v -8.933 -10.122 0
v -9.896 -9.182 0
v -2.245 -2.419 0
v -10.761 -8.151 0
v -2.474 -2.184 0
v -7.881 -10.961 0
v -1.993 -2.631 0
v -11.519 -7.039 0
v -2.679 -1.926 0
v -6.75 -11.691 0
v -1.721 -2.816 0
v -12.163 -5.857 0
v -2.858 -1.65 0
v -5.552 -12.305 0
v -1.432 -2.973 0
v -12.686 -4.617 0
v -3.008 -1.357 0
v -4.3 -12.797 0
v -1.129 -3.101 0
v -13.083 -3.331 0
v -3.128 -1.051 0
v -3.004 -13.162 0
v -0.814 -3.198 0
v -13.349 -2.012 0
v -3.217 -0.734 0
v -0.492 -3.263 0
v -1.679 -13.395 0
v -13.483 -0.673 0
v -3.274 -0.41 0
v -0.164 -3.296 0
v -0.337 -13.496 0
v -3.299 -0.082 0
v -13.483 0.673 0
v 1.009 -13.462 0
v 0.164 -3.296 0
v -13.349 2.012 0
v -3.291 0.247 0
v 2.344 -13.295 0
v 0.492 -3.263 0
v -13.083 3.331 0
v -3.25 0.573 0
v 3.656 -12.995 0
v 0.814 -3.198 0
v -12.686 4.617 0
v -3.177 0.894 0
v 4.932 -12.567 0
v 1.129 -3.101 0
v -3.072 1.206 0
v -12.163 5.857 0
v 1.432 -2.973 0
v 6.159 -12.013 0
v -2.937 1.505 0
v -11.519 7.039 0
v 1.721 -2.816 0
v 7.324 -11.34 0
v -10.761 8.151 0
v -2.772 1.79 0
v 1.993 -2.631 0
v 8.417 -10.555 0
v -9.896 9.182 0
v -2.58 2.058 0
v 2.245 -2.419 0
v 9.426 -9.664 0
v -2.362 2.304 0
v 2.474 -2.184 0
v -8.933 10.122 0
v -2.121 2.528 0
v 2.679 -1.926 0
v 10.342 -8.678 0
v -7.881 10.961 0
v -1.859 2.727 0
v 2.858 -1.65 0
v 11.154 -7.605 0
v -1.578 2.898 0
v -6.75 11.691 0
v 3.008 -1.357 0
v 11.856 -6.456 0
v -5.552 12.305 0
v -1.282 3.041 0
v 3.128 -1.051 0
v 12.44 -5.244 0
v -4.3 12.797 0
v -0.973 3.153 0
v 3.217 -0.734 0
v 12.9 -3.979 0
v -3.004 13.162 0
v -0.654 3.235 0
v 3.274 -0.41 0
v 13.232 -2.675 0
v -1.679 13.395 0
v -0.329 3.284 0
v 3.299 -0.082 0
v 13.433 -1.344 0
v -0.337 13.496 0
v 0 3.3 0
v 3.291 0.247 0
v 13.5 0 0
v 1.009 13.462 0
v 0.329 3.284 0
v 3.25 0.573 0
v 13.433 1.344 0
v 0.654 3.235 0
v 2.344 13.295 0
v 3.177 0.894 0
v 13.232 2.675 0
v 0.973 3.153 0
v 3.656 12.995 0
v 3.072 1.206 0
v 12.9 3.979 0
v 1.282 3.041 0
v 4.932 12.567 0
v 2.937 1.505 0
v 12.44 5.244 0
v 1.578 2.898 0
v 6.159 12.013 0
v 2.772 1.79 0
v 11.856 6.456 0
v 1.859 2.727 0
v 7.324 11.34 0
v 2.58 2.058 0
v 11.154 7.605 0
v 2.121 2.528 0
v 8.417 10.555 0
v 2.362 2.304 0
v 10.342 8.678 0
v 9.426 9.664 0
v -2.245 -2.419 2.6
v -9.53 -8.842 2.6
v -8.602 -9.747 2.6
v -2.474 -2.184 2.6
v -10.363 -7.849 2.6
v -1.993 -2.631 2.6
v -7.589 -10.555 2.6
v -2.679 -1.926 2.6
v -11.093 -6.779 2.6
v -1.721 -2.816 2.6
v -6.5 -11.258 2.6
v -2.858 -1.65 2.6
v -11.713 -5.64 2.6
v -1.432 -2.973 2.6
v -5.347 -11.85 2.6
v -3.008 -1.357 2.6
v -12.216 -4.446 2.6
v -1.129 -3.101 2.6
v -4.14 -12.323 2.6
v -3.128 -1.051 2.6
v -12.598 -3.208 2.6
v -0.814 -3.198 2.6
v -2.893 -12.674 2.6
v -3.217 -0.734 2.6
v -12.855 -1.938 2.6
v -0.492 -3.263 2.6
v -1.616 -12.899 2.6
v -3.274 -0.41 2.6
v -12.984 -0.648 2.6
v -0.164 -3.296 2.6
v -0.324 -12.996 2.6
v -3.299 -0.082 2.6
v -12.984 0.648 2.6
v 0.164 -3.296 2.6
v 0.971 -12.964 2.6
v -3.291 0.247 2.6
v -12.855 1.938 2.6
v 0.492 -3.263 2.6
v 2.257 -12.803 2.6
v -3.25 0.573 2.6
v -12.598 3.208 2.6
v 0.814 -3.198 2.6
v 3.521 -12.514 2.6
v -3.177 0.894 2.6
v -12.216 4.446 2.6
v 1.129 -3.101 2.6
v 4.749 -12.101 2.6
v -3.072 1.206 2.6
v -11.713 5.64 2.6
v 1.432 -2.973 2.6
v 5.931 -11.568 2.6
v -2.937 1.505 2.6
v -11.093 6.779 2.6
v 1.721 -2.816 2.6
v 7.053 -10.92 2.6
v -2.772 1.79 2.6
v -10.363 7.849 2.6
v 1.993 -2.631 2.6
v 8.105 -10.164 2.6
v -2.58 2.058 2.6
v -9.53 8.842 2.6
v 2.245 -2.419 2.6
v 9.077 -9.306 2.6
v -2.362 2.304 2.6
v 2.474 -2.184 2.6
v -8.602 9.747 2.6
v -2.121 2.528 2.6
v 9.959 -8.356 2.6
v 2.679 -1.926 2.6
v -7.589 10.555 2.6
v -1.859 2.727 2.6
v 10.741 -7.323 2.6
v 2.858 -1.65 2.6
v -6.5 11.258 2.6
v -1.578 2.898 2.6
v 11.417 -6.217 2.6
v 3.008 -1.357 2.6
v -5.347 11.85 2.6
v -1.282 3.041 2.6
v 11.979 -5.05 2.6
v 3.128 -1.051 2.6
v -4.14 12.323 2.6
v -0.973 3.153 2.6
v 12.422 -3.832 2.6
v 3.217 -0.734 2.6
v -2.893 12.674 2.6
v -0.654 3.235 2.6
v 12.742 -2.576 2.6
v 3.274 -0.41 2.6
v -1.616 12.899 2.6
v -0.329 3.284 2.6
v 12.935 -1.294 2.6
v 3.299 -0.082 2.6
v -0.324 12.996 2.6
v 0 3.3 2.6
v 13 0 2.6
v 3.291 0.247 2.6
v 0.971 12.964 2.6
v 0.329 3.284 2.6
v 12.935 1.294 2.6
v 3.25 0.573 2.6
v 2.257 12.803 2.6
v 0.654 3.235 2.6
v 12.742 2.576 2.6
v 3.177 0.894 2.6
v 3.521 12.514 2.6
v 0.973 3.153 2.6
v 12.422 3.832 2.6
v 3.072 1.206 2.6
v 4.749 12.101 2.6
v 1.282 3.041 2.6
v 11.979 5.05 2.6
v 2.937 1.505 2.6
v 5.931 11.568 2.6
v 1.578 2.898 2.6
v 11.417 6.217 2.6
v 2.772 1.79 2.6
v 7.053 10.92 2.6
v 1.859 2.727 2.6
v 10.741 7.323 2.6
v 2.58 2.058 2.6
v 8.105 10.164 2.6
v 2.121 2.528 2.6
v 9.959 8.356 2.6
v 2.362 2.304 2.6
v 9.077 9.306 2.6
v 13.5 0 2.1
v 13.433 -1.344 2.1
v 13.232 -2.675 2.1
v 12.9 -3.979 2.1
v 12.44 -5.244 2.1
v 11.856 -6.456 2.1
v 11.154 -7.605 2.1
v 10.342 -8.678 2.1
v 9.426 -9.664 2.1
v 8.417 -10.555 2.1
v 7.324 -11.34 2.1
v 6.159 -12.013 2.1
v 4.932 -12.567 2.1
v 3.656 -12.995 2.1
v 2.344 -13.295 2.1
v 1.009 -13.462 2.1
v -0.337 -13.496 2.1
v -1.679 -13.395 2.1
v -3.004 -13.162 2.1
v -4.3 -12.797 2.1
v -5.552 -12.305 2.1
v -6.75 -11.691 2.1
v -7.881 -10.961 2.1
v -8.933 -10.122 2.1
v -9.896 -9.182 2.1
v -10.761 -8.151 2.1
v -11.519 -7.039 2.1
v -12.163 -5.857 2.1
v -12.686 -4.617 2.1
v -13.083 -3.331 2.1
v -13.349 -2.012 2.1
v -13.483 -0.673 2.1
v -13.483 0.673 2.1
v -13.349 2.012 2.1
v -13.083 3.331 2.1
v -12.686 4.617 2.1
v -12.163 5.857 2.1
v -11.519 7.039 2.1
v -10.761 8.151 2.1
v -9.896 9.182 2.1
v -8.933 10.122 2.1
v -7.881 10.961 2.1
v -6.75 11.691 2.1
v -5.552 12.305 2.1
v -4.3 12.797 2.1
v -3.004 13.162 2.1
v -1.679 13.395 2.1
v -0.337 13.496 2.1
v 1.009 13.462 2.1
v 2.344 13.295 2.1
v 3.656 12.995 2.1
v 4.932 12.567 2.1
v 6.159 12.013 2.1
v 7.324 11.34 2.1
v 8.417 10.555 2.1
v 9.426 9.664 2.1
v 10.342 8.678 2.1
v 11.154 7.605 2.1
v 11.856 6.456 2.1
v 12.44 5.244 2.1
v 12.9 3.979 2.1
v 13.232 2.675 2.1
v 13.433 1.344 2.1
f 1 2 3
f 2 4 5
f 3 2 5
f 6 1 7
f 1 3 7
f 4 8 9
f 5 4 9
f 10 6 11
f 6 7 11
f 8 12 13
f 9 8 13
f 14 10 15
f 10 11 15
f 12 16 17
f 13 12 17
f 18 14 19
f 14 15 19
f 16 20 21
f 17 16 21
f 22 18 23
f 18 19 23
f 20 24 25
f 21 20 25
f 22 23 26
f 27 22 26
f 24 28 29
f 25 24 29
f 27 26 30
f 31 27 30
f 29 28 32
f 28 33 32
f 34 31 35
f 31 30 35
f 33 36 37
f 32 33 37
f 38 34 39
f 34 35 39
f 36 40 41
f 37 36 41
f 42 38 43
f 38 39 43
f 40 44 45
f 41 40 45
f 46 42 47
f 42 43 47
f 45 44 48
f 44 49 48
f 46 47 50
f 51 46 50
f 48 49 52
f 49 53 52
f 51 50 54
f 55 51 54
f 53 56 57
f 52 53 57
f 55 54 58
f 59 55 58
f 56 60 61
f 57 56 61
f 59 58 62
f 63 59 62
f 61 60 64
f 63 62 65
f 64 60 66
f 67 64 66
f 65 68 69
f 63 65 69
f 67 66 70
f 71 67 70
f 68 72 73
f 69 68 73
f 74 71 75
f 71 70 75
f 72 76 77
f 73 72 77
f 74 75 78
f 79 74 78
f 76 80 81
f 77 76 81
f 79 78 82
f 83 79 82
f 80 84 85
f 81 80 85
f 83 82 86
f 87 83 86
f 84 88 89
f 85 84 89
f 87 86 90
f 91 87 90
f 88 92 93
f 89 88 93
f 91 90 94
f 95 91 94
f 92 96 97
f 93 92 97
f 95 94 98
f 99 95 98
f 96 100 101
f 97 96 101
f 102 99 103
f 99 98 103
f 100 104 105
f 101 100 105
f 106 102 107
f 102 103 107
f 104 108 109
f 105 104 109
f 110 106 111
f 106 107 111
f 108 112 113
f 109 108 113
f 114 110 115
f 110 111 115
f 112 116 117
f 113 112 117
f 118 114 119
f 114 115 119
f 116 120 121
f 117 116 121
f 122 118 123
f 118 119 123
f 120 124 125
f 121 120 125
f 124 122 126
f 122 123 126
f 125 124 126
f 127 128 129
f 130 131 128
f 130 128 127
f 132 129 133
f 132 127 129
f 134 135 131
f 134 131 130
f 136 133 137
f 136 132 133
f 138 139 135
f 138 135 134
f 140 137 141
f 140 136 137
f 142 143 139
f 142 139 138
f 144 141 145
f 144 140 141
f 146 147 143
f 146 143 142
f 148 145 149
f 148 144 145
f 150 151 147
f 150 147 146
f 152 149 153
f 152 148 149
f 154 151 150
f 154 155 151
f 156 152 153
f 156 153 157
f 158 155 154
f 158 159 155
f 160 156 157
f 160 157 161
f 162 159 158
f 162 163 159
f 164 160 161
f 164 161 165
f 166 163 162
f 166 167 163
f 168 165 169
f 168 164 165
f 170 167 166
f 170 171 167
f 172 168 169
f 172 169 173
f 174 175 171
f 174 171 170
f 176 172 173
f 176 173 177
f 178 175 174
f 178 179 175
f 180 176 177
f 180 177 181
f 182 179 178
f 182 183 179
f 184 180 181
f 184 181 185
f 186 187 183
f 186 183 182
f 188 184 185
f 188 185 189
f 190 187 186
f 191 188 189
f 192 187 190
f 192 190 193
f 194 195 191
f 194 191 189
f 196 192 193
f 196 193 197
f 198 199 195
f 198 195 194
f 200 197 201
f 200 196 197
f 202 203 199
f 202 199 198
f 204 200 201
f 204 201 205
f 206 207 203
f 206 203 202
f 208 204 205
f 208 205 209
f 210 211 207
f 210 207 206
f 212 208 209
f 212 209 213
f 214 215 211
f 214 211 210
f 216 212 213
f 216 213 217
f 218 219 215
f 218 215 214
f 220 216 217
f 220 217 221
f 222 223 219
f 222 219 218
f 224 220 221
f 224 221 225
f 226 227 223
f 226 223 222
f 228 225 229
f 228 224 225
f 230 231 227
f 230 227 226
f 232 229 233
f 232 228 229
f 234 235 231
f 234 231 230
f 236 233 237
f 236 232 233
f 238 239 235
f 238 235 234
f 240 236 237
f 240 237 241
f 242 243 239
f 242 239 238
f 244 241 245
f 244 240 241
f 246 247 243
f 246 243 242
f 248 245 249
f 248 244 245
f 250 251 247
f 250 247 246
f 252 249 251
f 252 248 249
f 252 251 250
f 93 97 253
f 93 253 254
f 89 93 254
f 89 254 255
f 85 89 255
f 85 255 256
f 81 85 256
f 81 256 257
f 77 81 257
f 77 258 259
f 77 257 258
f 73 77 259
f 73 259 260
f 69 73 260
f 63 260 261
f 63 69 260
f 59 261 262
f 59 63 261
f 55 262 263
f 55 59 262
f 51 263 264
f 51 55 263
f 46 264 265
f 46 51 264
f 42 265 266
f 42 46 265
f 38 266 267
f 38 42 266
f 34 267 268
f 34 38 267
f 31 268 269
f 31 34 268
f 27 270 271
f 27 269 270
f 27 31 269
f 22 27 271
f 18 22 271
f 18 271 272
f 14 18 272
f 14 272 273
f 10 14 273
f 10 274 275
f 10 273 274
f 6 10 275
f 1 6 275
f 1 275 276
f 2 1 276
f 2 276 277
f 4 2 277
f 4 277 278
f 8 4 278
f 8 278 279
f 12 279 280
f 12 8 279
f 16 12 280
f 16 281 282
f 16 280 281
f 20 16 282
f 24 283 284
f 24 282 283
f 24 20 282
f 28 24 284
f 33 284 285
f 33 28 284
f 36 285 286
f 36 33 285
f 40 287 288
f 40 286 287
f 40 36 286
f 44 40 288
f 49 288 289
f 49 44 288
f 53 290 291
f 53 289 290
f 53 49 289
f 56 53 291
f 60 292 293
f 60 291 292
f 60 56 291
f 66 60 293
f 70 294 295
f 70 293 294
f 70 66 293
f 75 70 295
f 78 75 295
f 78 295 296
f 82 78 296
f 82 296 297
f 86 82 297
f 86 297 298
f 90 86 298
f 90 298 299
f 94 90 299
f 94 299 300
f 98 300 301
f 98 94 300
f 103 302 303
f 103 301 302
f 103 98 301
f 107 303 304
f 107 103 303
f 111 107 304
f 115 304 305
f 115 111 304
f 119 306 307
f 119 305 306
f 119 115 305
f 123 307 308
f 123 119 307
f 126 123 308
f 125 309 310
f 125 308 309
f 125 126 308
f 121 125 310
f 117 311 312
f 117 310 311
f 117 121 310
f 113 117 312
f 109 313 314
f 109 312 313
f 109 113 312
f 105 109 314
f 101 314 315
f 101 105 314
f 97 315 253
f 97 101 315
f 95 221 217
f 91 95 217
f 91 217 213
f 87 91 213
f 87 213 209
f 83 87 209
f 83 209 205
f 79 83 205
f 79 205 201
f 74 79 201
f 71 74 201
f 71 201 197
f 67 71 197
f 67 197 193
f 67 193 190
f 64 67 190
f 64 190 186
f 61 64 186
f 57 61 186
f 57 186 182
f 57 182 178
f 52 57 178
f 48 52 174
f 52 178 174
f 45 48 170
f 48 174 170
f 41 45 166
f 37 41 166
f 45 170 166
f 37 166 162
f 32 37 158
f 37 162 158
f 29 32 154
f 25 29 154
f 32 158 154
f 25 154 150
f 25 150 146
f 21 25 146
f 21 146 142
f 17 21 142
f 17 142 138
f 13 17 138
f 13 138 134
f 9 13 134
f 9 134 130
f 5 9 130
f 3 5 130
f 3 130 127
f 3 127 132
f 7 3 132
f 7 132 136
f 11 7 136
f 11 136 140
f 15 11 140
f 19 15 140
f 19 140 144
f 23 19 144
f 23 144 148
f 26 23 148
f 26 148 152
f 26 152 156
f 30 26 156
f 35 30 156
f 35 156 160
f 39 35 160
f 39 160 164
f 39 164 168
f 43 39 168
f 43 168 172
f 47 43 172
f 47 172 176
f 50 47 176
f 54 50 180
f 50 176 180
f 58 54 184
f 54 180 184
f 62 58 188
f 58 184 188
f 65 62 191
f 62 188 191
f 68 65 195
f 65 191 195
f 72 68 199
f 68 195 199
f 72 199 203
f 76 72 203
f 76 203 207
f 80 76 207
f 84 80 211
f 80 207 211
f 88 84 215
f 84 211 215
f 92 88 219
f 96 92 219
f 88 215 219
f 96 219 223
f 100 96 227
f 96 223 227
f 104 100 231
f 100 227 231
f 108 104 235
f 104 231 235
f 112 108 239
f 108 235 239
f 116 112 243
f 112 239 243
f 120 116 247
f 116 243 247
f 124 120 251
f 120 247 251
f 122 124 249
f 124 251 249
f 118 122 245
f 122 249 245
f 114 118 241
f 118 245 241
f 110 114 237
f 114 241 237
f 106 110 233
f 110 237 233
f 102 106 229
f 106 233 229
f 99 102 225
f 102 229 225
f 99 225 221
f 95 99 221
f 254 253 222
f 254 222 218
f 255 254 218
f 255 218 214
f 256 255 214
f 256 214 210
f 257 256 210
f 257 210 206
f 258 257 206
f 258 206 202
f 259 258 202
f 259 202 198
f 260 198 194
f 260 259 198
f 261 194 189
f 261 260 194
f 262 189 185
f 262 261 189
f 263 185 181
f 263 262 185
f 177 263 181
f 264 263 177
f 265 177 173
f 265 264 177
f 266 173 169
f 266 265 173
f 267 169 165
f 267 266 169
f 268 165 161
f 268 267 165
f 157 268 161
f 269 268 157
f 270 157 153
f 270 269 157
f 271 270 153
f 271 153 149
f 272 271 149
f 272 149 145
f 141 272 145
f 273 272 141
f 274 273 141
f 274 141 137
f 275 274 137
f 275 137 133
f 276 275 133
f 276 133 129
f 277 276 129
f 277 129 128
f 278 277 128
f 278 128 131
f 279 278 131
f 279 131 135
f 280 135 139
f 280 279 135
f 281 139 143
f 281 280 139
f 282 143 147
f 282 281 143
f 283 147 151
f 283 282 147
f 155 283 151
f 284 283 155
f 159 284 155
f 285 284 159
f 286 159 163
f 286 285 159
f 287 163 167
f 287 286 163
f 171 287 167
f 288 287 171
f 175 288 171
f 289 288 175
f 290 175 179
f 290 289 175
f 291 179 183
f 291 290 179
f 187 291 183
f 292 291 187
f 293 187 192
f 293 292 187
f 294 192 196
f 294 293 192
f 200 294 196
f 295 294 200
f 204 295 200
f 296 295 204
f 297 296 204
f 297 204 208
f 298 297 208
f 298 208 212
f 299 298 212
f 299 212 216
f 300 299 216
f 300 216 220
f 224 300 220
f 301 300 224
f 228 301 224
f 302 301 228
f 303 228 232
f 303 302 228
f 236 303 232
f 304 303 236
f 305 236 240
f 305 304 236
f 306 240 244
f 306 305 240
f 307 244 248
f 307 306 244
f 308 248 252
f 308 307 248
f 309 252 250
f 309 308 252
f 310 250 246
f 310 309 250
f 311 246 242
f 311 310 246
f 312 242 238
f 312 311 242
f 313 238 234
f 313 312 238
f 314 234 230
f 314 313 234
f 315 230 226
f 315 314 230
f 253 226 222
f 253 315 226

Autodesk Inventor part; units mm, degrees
ref_plane "YZ Plane" through (0, 0, 0) normal (1, 0, 0) x (0, 1, 0)
ref_plane "XZ Plane" through (0, 0, 0) normal (0, 1, 0) x (-1, 0, 0)
ref_plane "XY Plane" through (0, 0, 0) normal (0, 0, 1) x (1, 0, 0)
sketch "Skizze1" plane through (0, 0, 0) normal (0, 0, 1) x (1, 0, 0)
  circle A0 centre (0, 0) radius 13.5
  dimension "d0" = 27
extrude "Extrusion1" add sketch "Skizze1" along normal blind 2.6
chamfer "Fase1" distance 0.5 angle 45 1 edges at (-13.5, 0, 2.6)
sketch "Skizze2" plane through (0, 0, 0) normal (0, 0, -1) x (-1, 0, 0)
  point P0 (0, 0)
  point P1 (0, 0)
hole "Bohrung1" at (0, 0, 0) direction (0, 0, 1) diameter 6.6 depth 30 tip angle 118 clearance for "Flachkopfsenkschraube DIN EN ISO 2009" size "M6" standard "DIN"
equation "\"d0\" = Flansch_Klemmdeckelausnahme_Dia"
equation "\"KlemmdeckelHeight\" = 3"
equation "\"Flansch_Klemmdeckelausnahme_Dia\" = 27"
properties part number "Flansch_Wellennabeverbindung_Klemmdeckel" material "Edelstahl"
